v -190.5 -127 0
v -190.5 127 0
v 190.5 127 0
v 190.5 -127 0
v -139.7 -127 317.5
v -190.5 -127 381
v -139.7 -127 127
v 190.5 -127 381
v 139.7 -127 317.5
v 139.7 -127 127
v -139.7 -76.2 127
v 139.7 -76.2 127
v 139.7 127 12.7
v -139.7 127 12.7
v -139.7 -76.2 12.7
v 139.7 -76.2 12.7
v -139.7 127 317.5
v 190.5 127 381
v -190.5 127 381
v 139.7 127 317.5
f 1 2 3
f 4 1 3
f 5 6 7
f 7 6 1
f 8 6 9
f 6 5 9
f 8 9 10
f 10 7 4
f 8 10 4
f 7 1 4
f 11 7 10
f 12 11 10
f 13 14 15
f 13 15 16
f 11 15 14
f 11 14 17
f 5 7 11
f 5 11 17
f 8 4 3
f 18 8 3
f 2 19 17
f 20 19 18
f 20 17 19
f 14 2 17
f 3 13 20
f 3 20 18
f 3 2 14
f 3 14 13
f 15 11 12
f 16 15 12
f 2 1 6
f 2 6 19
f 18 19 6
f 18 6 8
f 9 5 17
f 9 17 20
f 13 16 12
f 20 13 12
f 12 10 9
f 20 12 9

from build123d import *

# Parameters (mm, degrees)
F0_W     = 381
F0_H     = 254
F1_DEPTH = 381
F2_W     = 279.4
F2_H     = 190.5
F3_DEPTH = 254.001
F4_W     = 279.4
F4_H     = 203.2
F5_DEPTH = 114.3


with BuildPart() as f1:
    # F0 (on Top) → F1 (new body)
    with BuildSketch(Plane.XY):
        Rectangle(F0_W, F0_H)
    extrude(amount=F1_DEPTH)

    # F2 (on face) → F3 (cut, through all)
    with BuildSketch(Plane.XZ.offset(127)):
        with Locations((0, 222.25)):
            Rectangle(F2_W, F2_H)
    extrude(amount=-F3_DEPTH, mode=Mode.SUBTRACT)

    # F4 (on face) → F5 (cut)
    with BuildSketch(Plane.XY.offset(127)):
        with Locations((0, 25.4)):
            Rectangle(F4_W, F4_H)
    extrude(amount=-F5_DEPTH, mode=Mode.SUBTRACT)


solid = f1.part
